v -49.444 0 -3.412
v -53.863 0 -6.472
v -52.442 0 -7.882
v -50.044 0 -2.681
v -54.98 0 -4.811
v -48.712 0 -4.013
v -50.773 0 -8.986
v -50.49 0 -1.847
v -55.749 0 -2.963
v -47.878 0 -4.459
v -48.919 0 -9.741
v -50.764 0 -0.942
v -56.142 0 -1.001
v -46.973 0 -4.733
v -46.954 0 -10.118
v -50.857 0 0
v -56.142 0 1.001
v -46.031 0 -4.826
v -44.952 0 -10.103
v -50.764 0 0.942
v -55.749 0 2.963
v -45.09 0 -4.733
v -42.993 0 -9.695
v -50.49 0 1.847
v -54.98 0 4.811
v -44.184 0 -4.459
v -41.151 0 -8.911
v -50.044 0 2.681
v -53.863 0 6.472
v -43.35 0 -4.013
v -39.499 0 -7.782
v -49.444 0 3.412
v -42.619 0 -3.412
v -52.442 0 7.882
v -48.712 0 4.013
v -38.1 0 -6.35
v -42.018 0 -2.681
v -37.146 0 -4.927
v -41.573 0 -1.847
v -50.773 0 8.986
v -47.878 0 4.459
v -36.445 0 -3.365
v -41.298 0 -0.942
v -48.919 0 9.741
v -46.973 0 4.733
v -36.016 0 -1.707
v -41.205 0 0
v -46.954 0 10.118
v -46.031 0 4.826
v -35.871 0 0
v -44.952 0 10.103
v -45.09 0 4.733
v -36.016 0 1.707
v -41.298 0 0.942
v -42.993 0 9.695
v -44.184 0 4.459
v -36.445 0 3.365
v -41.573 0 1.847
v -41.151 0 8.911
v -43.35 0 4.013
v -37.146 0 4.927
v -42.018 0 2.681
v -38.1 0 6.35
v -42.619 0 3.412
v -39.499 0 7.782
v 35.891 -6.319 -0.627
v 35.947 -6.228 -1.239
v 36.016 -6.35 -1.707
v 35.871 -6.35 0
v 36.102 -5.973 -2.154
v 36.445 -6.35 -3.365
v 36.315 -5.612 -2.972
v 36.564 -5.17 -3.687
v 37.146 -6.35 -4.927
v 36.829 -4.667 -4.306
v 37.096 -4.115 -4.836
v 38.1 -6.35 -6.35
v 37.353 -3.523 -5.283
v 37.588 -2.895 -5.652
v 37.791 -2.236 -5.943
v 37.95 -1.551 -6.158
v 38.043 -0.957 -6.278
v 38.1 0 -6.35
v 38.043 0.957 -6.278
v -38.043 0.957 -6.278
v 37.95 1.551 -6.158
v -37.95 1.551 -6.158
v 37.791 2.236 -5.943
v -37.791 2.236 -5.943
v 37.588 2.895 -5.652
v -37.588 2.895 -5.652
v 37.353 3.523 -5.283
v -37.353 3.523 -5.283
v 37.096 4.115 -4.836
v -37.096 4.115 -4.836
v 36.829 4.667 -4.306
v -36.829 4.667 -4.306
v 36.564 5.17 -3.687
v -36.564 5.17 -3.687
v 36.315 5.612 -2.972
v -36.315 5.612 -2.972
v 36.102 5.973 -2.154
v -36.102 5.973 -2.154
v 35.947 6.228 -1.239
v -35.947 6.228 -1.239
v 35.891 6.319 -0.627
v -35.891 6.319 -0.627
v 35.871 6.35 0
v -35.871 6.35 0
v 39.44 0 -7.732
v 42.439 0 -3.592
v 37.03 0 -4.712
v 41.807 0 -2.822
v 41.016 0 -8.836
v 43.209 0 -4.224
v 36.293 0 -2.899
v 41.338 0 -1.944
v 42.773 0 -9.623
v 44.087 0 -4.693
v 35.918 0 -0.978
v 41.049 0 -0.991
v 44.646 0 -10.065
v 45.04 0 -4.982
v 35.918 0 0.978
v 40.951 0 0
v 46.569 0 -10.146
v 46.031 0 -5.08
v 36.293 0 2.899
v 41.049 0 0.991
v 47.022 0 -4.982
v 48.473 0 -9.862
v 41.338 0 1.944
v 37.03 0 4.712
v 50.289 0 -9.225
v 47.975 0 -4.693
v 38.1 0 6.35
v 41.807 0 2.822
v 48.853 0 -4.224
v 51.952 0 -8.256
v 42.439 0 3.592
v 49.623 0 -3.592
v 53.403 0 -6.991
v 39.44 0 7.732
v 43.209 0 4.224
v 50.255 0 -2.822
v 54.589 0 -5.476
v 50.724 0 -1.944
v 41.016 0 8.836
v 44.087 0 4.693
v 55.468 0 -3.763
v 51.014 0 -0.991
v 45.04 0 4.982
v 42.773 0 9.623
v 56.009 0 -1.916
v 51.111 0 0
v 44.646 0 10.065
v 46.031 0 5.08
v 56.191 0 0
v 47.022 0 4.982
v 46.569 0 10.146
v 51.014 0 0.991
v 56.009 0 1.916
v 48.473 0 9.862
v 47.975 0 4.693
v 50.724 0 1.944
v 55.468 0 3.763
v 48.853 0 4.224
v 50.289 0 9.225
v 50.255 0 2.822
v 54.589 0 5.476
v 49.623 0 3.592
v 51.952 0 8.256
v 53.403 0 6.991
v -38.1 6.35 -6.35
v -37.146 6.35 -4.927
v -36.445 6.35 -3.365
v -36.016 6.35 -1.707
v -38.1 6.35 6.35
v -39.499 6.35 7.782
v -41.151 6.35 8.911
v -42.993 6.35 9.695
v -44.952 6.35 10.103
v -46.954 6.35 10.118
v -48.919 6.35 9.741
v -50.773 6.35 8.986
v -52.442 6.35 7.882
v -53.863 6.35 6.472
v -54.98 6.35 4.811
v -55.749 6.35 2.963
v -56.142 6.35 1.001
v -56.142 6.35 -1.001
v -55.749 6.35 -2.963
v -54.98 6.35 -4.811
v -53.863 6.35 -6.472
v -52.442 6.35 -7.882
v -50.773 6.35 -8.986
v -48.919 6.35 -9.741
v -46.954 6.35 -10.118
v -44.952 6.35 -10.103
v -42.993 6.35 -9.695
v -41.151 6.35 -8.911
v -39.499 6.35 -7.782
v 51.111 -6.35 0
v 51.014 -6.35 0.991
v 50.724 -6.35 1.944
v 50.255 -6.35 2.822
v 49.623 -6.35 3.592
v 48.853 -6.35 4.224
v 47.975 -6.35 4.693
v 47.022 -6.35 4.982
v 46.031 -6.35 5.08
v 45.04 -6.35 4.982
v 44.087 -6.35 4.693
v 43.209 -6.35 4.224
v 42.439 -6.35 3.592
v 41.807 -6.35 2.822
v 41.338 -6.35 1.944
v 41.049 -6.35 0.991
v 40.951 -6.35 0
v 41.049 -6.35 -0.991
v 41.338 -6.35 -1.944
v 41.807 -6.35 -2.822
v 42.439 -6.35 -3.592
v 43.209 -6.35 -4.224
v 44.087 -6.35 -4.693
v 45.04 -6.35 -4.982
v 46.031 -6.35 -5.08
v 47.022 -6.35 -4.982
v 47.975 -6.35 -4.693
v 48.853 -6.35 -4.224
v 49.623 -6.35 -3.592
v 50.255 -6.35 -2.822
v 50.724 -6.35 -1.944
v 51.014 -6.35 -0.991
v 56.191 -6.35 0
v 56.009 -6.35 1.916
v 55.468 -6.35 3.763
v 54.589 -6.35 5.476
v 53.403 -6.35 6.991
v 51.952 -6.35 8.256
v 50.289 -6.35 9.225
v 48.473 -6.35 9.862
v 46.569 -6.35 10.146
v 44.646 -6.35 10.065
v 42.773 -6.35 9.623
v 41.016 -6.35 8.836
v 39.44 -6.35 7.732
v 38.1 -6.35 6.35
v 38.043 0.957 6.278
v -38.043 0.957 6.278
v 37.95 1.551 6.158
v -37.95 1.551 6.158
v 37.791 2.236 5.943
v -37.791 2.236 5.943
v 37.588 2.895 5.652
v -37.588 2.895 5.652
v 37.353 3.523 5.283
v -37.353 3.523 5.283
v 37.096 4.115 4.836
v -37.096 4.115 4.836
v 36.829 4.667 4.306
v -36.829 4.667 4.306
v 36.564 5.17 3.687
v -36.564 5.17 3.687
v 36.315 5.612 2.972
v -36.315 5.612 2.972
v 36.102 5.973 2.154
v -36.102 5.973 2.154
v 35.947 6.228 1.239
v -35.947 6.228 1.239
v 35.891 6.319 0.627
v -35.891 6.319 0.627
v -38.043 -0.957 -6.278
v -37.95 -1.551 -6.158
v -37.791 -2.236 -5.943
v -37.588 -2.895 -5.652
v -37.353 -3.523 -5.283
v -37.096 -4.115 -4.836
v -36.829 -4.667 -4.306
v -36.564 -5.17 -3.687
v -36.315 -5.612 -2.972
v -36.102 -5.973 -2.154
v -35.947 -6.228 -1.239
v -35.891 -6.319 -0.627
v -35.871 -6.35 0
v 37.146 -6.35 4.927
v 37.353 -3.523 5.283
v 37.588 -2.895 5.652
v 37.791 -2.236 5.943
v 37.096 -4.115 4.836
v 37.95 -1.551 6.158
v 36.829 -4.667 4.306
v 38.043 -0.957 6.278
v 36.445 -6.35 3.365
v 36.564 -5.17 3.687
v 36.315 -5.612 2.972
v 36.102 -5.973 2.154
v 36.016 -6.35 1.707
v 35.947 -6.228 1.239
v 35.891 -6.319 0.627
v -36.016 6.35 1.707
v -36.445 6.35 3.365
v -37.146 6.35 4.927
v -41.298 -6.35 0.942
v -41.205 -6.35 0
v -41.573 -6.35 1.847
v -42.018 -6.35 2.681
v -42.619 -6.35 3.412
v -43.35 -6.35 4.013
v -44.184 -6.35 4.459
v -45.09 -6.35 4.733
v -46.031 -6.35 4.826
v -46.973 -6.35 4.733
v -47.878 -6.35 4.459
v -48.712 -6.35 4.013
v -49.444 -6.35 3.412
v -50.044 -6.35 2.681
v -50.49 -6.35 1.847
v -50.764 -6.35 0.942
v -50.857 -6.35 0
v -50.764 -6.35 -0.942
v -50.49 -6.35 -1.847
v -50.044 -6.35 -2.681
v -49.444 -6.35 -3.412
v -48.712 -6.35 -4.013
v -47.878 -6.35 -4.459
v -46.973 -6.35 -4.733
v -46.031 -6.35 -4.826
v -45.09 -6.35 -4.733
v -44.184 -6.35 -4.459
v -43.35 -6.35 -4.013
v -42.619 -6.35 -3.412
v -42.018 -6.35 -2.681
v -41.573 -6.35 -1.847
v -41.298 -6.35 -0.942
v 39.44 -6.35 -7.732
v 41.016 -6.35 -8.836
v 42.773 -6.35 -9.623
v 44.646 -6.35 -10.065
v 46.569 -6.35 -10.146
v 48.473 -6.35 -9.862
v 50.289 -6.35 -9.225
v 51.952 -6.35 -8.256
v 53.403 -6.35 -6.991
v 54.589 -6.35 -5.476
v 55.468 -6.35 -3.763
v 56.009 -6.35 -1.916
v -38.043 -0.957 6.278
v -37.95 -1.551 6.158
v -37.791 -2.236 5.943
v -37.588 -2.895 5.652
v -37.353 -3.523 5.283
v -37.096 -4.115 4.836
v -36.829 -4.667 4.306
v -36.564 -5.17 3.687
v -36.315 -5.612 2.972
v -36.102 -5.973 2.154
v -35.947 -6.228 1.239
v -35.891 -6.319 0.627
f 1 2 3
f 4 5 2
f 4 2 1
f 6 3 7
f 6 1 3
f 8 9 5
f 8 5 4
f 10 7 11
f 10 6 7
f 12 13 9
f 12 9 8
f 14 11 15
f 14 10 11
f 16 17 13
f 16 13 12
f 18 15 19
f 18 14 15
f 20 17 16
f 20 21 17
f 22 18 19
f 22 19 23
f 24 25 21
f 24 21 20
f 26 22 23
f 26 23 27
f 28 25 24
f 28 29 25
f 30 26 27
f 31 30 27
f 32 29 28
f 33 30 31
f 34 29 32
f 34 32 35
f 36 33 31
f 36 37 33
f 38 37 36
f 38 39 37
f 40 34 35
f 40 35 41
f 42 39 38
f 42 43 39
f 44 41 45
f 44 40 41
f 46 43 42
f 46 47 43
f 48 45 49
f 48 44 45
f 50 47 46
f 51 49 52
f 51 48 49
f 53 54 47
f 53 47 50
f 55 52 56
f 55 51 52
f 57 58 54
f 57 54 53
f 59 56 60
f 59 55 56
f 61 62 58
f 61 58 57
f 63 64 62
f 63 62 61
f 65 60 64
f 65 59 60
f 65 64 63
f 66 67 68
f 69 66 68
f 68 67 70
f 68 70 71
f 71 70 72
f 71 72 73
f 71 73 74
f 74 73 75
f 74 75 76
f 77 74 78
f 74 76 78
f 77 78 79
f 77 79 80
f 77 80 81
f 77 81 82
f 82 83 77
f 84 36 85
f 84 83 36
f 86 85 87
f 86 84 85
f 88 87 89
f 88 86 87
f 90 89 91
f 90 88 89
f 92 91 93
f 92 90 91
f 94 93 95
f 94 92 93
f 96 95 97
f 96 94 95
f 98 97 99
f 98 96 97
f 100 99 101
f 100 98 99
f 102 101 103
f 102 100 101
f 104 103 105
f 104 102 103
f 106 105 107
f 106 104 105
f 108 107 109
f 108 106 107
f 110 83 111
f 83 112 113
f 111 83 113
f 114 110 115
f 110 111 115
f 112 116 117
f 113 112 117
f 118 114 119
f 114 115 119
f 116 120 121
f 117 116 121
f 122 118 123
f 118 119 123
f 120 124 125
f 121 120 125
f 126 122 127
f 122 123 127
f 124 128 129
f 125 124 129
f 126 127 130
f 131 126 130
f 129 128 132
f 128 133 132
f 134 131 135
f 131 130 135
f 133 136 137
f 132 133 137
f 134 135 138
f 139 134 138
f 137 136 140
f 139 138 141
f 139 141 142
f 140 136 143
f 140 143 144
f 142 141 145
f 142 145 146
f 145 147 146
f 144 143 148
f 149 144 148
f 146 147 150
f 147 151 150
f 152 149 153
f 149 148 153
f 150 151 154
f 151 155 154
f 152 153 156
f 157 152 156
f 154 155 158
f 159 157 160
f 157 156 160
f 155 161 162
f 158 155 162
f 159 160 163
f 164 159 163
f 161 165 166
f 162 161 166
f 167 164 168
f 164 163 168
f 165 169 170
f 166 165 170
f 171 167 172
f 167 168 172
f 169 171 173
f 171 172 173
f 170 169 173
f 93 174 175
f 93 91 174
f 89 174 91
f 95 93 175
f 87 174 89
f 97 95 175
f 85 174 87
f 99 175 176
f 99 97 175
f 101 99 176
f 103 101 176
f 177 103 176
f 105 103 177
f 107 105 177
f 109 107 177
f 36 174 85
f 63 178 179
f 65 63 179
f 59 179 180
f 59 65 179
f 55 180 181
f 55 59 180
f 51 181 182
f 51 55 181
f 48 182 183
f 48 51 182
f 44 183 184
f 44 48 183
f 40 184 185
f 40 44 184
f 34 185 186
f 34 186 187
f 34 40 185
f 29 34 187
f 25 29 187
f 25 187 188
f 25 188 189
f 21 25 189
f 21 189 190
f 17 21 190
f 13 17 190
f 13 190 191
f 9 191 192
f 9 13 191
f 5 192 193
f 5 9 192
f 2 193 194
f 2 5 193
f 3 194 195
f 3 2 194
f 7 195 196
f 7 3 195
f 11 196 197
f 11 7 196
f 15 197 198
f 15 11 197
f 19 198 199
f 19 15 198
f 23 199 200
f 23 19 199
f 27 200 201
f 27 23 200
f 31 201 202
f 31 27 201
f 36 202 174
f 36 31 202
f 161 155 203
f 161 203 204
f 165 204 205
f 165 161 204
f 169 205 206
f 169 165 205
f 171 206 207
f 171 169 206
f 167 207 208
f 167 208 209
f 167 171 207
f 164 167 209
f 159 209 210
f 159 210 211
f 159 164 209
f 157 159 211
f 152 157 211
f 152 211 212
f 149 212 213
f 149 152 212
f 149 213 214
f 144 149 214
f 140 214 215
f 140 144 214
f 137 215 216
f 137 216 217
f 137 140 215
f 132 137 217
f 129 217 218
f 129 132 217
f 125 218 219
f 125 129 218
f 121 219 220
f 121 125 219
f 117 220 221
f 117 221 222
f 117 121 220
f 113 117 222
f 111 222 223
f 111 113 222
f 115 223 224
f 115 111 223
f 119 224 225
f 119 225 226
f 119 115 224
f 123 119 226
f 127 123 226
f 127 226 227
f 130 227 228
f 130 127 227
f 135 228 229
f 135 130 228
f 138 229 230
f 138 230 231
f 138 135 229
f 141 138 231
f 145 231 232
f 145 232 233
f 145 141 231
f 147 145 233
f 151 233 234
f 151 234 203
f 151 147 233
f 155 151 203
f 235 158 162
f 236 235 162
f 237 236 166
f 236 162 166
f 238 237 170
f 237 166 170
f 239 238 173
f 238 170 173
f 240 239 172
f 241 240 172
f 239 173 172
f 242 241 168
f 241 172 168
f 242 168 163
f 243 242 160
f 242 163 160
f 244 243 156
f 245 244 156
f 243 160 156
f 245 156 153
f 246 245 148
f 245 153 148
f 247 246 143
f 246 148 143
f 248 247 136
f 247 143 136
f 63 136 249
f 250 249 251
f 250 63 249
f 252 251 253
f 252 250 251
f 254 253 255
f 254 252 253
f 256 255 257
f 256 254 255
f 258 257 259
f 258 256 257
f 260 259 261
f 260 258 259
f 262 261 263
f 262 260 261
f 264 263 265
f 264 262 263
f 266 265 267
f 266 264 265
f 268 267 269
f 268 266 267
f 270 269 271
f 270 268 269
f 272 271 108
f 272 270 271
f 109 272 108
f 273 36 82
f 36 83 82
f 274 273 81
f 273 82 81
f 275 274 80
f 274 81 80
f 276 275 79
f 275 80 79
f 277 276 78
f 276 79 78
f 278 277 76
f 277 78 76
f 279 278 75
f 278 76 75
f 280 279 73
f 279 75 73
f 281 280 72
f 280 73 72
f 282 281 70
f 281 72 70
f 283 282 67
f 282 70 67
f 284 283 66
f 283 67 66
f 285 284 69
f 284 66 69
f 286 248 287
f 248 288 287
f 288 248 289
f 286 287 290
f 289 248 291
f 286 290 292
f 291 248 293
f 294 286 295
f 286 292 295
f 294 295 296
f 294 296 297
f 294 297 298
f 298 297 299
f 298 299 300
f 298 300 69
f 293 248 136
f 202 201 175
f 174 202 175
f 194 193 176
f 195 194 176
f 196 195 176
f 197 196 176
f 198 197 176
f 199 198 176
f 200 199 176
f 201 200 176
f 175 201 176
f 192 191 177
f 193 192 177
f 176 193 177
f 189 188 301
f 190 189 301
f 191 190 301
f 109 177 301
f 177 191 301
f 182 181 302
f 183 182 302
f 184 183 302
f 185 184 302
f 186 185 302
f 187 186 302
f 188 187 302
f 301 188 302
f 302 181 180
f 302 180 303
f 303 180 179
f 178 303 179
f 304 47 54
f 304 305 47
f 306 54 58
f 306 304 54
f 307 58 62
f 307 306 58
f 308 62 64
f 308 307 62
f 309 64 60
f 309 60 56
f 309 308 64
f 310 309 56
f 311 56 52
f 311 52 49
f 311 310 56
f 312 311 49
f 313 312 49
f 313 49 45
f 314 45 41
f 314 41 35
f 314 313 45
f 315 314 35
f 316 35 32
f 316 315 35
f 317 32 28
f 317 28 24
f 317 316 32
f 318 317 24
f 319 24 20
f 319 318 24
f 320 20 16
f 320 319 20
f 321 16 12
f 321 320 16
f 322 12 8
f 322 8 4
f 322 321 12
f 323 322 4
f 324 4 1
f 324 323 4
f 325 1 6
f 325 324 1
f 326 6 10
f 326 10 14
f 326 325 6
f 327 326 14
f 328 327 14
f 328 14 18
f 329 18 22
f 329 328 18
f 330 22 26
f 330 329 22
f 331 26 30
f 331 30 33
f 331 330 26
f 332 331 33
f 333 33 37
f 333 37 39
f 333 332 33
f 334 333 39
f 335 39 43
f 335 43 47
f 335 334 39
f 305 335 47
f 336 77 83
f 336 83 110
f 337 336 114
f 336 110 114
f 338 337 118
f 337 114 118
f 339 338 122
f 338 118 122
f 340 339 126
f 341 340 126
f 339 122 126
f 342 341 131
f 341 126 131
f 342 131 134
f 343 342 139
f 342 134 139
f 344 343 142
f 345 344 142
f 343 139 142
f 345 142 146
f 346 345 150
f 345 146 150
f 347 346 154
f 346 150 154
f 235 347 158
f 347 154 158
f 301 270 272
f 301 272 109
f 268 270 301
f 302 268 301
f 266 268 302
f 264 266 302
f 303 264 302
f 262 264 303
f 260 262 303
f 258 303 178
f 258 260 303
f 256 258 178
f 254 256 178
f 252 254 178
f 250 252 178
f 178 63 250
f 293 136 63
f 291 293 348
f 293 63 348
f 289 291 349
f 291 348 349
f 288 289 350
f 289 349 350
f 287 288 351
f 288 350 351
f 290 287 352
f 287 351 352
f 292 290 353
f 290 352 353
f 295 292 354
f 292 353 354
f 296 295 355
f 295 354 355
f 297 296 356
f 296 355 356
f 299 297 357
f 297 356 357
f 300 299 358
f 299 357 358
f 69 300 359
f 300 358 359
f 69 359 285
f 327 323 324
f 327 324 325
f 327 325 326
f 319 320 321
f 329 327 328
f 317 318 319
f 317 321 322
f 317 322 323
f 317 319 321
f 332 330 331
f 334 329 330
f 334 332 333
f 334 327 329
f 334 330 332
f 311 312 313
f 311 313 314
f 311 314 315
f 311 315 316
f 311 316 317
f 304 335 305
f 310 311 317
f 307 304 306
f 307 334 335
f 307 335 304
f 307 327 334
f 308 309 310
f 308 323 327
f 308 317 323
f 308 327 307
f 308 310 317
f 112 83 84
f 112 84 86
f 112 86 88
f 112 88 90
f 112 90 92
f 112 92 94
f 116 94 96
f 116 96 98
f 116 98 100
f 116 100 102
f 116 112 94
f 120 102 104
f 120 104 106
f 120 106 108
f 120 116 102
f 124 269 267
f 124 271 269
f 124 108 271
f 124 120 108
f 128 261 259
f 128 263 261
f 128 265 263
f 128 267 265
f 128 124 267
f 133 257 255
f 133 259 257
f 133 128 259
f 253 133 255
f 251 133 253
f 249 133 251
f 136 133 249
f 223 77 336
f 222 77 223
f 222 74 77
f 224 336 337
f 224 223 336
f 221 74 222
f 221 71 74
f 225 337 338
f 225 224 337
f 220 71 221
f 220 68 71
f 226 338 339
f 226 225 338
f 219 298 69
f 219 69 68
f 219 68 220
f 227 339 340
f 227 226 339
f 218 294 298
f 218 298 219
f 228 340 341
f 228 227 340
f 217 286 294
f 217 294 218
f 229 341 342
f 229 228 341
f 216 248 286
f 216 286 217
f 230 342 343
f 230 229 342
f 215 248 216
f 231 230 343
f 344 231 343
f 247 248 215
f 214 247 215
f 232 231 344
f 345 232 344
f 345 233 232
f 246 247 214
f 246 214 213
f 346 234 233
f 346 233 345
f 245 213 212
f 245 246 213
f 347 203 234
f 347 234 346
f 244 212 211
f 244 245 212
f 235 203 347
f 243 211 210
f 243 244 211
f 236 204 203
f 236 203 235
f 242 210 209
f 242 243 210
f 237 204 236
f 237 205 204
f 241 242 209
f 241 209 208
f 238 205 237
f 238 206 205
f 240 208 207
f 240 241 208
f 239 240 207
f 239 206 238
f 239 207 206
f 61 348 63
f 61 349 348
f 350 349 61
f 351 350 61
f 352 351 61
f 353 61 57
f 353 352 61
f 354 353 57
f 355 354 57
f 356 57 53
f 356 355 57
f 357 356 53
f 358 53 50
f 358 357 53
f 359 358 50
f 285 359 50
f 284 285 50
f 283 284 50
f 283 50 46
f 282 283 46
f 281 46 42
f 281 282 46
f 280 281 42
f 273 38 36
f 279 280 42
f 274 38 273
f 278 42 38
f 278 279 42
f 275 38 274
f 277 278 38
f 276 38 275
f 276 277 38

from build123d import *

# Parameters (mm, degrees)
F1_DEPTH = 6.35
F2_R     = 6.3499
F0_R     = 5.08
F3_DEPTH = 6.35
F0_R_2   = 4.826
F4_DEPTH = 6.35
F5_DEPTH = 6.35


# Not quite as in the source:
# - a fillet or chamfer is up to 0.001 mm smaller than in the source, because OpenCascade refuses the exact size


with BuildPart() as f1:
    # F0 (on Front) → F1 (new body, symmetric)
    with BuildSketch(Plane.XZ):
        with BuildLine():
            Line((38.1, 6.35), (-38.1, 6.35))
            ThreePointArc((-38.1, 6.35), (-36.4445407024, 3.3649028089), (-35.871147458, 0))
            ThreePointArc((-35.871147458, 0), (-36.4445407024, -3.3649028089), (-38.1, -6.35))
            Line((-38.1, -6.35), (38.1, -6.35))
            ThreePointArc((38.1, -6.35), (35.871147458, 0), (38.1, 6.35))
        make_face()
    extrude(amount=F1_DEPTH, both=True)

    # F2 (radius 6.35 in the source; OpenCascade refuses exactly that, so slightly less here)
    f2_edges = [f1.edges().sort_by_distance(p)[0] for p in [
        (0, -6.35, 6.35),
        (0, 6.35, 6.35),
        (0, -6.35, -6.35),
        (0, 6.35, -6.35),
    ]]
    fillet(f2_edges, radius=F2_R)

    # F0 (on Front) → F3 (join)
    with BuildSketch(Plane.XZ):
        with BuildLine():
            Line((38.1, -6.35), (38.1, 6.35))
            ThreePointArc((38.1, 6.35), (35.871147458, 0), (38.1, -6.35))
        make_face()
        with BuildLine():
            ThreePointArc((56.191147458, 0), (49.3960502669, 9.5866067556), (38.1, 6.35))
            Line((38.1, 6.35), (38.1, -6.35))
            ThreePointArc((38.1, -6.35), (49.3960502669, -9.5866067556), (56.191147458, 0))
        make_face()
        with Locations((46.031147458, 0)):
            Circle(F0_R, mode=Mode.SUBTRACT)
    extrude(amount=F3_DEPTH)

    # F0 (on Front) → F4 (join)
    with BuildSketch(Plane.XZ):
        with BuildLine():
            Line((-38.1, -6.35), (-38.1, 6.35))
            ThreePointArc((-38.1, 6.35), (-56.191147458, 0), (-38.1, -6.35))
        make_face()
        with Locations((-46.031147458, 0)):
            Circle(F0_R_2, mode=Mode.SUBTRACT)
        with BuildLine():
            ThreePointArc((-35.871147458, 0), (-36.4445407024, 3.3649028089), (-38.1, 6.35))
            Line((-38.1, 6.35), (-38.1, -6.35))
            ThreePointArc((-38.1, -6.35), (-36.4445407024, -3.3649028089), (-35.871147458, 0))
        make_face()
    extrude(amount=-F4_DEPTH)

    # F0 (on Front) → F5 (join, symmetric)
    with BuildSketch(Plane.XZ):
        with Locations((-46.031147458, 0)):
            Circle(F0_R_2)
    extrude(amount=F5_DEPTH, both=True)


solid = f1.part
